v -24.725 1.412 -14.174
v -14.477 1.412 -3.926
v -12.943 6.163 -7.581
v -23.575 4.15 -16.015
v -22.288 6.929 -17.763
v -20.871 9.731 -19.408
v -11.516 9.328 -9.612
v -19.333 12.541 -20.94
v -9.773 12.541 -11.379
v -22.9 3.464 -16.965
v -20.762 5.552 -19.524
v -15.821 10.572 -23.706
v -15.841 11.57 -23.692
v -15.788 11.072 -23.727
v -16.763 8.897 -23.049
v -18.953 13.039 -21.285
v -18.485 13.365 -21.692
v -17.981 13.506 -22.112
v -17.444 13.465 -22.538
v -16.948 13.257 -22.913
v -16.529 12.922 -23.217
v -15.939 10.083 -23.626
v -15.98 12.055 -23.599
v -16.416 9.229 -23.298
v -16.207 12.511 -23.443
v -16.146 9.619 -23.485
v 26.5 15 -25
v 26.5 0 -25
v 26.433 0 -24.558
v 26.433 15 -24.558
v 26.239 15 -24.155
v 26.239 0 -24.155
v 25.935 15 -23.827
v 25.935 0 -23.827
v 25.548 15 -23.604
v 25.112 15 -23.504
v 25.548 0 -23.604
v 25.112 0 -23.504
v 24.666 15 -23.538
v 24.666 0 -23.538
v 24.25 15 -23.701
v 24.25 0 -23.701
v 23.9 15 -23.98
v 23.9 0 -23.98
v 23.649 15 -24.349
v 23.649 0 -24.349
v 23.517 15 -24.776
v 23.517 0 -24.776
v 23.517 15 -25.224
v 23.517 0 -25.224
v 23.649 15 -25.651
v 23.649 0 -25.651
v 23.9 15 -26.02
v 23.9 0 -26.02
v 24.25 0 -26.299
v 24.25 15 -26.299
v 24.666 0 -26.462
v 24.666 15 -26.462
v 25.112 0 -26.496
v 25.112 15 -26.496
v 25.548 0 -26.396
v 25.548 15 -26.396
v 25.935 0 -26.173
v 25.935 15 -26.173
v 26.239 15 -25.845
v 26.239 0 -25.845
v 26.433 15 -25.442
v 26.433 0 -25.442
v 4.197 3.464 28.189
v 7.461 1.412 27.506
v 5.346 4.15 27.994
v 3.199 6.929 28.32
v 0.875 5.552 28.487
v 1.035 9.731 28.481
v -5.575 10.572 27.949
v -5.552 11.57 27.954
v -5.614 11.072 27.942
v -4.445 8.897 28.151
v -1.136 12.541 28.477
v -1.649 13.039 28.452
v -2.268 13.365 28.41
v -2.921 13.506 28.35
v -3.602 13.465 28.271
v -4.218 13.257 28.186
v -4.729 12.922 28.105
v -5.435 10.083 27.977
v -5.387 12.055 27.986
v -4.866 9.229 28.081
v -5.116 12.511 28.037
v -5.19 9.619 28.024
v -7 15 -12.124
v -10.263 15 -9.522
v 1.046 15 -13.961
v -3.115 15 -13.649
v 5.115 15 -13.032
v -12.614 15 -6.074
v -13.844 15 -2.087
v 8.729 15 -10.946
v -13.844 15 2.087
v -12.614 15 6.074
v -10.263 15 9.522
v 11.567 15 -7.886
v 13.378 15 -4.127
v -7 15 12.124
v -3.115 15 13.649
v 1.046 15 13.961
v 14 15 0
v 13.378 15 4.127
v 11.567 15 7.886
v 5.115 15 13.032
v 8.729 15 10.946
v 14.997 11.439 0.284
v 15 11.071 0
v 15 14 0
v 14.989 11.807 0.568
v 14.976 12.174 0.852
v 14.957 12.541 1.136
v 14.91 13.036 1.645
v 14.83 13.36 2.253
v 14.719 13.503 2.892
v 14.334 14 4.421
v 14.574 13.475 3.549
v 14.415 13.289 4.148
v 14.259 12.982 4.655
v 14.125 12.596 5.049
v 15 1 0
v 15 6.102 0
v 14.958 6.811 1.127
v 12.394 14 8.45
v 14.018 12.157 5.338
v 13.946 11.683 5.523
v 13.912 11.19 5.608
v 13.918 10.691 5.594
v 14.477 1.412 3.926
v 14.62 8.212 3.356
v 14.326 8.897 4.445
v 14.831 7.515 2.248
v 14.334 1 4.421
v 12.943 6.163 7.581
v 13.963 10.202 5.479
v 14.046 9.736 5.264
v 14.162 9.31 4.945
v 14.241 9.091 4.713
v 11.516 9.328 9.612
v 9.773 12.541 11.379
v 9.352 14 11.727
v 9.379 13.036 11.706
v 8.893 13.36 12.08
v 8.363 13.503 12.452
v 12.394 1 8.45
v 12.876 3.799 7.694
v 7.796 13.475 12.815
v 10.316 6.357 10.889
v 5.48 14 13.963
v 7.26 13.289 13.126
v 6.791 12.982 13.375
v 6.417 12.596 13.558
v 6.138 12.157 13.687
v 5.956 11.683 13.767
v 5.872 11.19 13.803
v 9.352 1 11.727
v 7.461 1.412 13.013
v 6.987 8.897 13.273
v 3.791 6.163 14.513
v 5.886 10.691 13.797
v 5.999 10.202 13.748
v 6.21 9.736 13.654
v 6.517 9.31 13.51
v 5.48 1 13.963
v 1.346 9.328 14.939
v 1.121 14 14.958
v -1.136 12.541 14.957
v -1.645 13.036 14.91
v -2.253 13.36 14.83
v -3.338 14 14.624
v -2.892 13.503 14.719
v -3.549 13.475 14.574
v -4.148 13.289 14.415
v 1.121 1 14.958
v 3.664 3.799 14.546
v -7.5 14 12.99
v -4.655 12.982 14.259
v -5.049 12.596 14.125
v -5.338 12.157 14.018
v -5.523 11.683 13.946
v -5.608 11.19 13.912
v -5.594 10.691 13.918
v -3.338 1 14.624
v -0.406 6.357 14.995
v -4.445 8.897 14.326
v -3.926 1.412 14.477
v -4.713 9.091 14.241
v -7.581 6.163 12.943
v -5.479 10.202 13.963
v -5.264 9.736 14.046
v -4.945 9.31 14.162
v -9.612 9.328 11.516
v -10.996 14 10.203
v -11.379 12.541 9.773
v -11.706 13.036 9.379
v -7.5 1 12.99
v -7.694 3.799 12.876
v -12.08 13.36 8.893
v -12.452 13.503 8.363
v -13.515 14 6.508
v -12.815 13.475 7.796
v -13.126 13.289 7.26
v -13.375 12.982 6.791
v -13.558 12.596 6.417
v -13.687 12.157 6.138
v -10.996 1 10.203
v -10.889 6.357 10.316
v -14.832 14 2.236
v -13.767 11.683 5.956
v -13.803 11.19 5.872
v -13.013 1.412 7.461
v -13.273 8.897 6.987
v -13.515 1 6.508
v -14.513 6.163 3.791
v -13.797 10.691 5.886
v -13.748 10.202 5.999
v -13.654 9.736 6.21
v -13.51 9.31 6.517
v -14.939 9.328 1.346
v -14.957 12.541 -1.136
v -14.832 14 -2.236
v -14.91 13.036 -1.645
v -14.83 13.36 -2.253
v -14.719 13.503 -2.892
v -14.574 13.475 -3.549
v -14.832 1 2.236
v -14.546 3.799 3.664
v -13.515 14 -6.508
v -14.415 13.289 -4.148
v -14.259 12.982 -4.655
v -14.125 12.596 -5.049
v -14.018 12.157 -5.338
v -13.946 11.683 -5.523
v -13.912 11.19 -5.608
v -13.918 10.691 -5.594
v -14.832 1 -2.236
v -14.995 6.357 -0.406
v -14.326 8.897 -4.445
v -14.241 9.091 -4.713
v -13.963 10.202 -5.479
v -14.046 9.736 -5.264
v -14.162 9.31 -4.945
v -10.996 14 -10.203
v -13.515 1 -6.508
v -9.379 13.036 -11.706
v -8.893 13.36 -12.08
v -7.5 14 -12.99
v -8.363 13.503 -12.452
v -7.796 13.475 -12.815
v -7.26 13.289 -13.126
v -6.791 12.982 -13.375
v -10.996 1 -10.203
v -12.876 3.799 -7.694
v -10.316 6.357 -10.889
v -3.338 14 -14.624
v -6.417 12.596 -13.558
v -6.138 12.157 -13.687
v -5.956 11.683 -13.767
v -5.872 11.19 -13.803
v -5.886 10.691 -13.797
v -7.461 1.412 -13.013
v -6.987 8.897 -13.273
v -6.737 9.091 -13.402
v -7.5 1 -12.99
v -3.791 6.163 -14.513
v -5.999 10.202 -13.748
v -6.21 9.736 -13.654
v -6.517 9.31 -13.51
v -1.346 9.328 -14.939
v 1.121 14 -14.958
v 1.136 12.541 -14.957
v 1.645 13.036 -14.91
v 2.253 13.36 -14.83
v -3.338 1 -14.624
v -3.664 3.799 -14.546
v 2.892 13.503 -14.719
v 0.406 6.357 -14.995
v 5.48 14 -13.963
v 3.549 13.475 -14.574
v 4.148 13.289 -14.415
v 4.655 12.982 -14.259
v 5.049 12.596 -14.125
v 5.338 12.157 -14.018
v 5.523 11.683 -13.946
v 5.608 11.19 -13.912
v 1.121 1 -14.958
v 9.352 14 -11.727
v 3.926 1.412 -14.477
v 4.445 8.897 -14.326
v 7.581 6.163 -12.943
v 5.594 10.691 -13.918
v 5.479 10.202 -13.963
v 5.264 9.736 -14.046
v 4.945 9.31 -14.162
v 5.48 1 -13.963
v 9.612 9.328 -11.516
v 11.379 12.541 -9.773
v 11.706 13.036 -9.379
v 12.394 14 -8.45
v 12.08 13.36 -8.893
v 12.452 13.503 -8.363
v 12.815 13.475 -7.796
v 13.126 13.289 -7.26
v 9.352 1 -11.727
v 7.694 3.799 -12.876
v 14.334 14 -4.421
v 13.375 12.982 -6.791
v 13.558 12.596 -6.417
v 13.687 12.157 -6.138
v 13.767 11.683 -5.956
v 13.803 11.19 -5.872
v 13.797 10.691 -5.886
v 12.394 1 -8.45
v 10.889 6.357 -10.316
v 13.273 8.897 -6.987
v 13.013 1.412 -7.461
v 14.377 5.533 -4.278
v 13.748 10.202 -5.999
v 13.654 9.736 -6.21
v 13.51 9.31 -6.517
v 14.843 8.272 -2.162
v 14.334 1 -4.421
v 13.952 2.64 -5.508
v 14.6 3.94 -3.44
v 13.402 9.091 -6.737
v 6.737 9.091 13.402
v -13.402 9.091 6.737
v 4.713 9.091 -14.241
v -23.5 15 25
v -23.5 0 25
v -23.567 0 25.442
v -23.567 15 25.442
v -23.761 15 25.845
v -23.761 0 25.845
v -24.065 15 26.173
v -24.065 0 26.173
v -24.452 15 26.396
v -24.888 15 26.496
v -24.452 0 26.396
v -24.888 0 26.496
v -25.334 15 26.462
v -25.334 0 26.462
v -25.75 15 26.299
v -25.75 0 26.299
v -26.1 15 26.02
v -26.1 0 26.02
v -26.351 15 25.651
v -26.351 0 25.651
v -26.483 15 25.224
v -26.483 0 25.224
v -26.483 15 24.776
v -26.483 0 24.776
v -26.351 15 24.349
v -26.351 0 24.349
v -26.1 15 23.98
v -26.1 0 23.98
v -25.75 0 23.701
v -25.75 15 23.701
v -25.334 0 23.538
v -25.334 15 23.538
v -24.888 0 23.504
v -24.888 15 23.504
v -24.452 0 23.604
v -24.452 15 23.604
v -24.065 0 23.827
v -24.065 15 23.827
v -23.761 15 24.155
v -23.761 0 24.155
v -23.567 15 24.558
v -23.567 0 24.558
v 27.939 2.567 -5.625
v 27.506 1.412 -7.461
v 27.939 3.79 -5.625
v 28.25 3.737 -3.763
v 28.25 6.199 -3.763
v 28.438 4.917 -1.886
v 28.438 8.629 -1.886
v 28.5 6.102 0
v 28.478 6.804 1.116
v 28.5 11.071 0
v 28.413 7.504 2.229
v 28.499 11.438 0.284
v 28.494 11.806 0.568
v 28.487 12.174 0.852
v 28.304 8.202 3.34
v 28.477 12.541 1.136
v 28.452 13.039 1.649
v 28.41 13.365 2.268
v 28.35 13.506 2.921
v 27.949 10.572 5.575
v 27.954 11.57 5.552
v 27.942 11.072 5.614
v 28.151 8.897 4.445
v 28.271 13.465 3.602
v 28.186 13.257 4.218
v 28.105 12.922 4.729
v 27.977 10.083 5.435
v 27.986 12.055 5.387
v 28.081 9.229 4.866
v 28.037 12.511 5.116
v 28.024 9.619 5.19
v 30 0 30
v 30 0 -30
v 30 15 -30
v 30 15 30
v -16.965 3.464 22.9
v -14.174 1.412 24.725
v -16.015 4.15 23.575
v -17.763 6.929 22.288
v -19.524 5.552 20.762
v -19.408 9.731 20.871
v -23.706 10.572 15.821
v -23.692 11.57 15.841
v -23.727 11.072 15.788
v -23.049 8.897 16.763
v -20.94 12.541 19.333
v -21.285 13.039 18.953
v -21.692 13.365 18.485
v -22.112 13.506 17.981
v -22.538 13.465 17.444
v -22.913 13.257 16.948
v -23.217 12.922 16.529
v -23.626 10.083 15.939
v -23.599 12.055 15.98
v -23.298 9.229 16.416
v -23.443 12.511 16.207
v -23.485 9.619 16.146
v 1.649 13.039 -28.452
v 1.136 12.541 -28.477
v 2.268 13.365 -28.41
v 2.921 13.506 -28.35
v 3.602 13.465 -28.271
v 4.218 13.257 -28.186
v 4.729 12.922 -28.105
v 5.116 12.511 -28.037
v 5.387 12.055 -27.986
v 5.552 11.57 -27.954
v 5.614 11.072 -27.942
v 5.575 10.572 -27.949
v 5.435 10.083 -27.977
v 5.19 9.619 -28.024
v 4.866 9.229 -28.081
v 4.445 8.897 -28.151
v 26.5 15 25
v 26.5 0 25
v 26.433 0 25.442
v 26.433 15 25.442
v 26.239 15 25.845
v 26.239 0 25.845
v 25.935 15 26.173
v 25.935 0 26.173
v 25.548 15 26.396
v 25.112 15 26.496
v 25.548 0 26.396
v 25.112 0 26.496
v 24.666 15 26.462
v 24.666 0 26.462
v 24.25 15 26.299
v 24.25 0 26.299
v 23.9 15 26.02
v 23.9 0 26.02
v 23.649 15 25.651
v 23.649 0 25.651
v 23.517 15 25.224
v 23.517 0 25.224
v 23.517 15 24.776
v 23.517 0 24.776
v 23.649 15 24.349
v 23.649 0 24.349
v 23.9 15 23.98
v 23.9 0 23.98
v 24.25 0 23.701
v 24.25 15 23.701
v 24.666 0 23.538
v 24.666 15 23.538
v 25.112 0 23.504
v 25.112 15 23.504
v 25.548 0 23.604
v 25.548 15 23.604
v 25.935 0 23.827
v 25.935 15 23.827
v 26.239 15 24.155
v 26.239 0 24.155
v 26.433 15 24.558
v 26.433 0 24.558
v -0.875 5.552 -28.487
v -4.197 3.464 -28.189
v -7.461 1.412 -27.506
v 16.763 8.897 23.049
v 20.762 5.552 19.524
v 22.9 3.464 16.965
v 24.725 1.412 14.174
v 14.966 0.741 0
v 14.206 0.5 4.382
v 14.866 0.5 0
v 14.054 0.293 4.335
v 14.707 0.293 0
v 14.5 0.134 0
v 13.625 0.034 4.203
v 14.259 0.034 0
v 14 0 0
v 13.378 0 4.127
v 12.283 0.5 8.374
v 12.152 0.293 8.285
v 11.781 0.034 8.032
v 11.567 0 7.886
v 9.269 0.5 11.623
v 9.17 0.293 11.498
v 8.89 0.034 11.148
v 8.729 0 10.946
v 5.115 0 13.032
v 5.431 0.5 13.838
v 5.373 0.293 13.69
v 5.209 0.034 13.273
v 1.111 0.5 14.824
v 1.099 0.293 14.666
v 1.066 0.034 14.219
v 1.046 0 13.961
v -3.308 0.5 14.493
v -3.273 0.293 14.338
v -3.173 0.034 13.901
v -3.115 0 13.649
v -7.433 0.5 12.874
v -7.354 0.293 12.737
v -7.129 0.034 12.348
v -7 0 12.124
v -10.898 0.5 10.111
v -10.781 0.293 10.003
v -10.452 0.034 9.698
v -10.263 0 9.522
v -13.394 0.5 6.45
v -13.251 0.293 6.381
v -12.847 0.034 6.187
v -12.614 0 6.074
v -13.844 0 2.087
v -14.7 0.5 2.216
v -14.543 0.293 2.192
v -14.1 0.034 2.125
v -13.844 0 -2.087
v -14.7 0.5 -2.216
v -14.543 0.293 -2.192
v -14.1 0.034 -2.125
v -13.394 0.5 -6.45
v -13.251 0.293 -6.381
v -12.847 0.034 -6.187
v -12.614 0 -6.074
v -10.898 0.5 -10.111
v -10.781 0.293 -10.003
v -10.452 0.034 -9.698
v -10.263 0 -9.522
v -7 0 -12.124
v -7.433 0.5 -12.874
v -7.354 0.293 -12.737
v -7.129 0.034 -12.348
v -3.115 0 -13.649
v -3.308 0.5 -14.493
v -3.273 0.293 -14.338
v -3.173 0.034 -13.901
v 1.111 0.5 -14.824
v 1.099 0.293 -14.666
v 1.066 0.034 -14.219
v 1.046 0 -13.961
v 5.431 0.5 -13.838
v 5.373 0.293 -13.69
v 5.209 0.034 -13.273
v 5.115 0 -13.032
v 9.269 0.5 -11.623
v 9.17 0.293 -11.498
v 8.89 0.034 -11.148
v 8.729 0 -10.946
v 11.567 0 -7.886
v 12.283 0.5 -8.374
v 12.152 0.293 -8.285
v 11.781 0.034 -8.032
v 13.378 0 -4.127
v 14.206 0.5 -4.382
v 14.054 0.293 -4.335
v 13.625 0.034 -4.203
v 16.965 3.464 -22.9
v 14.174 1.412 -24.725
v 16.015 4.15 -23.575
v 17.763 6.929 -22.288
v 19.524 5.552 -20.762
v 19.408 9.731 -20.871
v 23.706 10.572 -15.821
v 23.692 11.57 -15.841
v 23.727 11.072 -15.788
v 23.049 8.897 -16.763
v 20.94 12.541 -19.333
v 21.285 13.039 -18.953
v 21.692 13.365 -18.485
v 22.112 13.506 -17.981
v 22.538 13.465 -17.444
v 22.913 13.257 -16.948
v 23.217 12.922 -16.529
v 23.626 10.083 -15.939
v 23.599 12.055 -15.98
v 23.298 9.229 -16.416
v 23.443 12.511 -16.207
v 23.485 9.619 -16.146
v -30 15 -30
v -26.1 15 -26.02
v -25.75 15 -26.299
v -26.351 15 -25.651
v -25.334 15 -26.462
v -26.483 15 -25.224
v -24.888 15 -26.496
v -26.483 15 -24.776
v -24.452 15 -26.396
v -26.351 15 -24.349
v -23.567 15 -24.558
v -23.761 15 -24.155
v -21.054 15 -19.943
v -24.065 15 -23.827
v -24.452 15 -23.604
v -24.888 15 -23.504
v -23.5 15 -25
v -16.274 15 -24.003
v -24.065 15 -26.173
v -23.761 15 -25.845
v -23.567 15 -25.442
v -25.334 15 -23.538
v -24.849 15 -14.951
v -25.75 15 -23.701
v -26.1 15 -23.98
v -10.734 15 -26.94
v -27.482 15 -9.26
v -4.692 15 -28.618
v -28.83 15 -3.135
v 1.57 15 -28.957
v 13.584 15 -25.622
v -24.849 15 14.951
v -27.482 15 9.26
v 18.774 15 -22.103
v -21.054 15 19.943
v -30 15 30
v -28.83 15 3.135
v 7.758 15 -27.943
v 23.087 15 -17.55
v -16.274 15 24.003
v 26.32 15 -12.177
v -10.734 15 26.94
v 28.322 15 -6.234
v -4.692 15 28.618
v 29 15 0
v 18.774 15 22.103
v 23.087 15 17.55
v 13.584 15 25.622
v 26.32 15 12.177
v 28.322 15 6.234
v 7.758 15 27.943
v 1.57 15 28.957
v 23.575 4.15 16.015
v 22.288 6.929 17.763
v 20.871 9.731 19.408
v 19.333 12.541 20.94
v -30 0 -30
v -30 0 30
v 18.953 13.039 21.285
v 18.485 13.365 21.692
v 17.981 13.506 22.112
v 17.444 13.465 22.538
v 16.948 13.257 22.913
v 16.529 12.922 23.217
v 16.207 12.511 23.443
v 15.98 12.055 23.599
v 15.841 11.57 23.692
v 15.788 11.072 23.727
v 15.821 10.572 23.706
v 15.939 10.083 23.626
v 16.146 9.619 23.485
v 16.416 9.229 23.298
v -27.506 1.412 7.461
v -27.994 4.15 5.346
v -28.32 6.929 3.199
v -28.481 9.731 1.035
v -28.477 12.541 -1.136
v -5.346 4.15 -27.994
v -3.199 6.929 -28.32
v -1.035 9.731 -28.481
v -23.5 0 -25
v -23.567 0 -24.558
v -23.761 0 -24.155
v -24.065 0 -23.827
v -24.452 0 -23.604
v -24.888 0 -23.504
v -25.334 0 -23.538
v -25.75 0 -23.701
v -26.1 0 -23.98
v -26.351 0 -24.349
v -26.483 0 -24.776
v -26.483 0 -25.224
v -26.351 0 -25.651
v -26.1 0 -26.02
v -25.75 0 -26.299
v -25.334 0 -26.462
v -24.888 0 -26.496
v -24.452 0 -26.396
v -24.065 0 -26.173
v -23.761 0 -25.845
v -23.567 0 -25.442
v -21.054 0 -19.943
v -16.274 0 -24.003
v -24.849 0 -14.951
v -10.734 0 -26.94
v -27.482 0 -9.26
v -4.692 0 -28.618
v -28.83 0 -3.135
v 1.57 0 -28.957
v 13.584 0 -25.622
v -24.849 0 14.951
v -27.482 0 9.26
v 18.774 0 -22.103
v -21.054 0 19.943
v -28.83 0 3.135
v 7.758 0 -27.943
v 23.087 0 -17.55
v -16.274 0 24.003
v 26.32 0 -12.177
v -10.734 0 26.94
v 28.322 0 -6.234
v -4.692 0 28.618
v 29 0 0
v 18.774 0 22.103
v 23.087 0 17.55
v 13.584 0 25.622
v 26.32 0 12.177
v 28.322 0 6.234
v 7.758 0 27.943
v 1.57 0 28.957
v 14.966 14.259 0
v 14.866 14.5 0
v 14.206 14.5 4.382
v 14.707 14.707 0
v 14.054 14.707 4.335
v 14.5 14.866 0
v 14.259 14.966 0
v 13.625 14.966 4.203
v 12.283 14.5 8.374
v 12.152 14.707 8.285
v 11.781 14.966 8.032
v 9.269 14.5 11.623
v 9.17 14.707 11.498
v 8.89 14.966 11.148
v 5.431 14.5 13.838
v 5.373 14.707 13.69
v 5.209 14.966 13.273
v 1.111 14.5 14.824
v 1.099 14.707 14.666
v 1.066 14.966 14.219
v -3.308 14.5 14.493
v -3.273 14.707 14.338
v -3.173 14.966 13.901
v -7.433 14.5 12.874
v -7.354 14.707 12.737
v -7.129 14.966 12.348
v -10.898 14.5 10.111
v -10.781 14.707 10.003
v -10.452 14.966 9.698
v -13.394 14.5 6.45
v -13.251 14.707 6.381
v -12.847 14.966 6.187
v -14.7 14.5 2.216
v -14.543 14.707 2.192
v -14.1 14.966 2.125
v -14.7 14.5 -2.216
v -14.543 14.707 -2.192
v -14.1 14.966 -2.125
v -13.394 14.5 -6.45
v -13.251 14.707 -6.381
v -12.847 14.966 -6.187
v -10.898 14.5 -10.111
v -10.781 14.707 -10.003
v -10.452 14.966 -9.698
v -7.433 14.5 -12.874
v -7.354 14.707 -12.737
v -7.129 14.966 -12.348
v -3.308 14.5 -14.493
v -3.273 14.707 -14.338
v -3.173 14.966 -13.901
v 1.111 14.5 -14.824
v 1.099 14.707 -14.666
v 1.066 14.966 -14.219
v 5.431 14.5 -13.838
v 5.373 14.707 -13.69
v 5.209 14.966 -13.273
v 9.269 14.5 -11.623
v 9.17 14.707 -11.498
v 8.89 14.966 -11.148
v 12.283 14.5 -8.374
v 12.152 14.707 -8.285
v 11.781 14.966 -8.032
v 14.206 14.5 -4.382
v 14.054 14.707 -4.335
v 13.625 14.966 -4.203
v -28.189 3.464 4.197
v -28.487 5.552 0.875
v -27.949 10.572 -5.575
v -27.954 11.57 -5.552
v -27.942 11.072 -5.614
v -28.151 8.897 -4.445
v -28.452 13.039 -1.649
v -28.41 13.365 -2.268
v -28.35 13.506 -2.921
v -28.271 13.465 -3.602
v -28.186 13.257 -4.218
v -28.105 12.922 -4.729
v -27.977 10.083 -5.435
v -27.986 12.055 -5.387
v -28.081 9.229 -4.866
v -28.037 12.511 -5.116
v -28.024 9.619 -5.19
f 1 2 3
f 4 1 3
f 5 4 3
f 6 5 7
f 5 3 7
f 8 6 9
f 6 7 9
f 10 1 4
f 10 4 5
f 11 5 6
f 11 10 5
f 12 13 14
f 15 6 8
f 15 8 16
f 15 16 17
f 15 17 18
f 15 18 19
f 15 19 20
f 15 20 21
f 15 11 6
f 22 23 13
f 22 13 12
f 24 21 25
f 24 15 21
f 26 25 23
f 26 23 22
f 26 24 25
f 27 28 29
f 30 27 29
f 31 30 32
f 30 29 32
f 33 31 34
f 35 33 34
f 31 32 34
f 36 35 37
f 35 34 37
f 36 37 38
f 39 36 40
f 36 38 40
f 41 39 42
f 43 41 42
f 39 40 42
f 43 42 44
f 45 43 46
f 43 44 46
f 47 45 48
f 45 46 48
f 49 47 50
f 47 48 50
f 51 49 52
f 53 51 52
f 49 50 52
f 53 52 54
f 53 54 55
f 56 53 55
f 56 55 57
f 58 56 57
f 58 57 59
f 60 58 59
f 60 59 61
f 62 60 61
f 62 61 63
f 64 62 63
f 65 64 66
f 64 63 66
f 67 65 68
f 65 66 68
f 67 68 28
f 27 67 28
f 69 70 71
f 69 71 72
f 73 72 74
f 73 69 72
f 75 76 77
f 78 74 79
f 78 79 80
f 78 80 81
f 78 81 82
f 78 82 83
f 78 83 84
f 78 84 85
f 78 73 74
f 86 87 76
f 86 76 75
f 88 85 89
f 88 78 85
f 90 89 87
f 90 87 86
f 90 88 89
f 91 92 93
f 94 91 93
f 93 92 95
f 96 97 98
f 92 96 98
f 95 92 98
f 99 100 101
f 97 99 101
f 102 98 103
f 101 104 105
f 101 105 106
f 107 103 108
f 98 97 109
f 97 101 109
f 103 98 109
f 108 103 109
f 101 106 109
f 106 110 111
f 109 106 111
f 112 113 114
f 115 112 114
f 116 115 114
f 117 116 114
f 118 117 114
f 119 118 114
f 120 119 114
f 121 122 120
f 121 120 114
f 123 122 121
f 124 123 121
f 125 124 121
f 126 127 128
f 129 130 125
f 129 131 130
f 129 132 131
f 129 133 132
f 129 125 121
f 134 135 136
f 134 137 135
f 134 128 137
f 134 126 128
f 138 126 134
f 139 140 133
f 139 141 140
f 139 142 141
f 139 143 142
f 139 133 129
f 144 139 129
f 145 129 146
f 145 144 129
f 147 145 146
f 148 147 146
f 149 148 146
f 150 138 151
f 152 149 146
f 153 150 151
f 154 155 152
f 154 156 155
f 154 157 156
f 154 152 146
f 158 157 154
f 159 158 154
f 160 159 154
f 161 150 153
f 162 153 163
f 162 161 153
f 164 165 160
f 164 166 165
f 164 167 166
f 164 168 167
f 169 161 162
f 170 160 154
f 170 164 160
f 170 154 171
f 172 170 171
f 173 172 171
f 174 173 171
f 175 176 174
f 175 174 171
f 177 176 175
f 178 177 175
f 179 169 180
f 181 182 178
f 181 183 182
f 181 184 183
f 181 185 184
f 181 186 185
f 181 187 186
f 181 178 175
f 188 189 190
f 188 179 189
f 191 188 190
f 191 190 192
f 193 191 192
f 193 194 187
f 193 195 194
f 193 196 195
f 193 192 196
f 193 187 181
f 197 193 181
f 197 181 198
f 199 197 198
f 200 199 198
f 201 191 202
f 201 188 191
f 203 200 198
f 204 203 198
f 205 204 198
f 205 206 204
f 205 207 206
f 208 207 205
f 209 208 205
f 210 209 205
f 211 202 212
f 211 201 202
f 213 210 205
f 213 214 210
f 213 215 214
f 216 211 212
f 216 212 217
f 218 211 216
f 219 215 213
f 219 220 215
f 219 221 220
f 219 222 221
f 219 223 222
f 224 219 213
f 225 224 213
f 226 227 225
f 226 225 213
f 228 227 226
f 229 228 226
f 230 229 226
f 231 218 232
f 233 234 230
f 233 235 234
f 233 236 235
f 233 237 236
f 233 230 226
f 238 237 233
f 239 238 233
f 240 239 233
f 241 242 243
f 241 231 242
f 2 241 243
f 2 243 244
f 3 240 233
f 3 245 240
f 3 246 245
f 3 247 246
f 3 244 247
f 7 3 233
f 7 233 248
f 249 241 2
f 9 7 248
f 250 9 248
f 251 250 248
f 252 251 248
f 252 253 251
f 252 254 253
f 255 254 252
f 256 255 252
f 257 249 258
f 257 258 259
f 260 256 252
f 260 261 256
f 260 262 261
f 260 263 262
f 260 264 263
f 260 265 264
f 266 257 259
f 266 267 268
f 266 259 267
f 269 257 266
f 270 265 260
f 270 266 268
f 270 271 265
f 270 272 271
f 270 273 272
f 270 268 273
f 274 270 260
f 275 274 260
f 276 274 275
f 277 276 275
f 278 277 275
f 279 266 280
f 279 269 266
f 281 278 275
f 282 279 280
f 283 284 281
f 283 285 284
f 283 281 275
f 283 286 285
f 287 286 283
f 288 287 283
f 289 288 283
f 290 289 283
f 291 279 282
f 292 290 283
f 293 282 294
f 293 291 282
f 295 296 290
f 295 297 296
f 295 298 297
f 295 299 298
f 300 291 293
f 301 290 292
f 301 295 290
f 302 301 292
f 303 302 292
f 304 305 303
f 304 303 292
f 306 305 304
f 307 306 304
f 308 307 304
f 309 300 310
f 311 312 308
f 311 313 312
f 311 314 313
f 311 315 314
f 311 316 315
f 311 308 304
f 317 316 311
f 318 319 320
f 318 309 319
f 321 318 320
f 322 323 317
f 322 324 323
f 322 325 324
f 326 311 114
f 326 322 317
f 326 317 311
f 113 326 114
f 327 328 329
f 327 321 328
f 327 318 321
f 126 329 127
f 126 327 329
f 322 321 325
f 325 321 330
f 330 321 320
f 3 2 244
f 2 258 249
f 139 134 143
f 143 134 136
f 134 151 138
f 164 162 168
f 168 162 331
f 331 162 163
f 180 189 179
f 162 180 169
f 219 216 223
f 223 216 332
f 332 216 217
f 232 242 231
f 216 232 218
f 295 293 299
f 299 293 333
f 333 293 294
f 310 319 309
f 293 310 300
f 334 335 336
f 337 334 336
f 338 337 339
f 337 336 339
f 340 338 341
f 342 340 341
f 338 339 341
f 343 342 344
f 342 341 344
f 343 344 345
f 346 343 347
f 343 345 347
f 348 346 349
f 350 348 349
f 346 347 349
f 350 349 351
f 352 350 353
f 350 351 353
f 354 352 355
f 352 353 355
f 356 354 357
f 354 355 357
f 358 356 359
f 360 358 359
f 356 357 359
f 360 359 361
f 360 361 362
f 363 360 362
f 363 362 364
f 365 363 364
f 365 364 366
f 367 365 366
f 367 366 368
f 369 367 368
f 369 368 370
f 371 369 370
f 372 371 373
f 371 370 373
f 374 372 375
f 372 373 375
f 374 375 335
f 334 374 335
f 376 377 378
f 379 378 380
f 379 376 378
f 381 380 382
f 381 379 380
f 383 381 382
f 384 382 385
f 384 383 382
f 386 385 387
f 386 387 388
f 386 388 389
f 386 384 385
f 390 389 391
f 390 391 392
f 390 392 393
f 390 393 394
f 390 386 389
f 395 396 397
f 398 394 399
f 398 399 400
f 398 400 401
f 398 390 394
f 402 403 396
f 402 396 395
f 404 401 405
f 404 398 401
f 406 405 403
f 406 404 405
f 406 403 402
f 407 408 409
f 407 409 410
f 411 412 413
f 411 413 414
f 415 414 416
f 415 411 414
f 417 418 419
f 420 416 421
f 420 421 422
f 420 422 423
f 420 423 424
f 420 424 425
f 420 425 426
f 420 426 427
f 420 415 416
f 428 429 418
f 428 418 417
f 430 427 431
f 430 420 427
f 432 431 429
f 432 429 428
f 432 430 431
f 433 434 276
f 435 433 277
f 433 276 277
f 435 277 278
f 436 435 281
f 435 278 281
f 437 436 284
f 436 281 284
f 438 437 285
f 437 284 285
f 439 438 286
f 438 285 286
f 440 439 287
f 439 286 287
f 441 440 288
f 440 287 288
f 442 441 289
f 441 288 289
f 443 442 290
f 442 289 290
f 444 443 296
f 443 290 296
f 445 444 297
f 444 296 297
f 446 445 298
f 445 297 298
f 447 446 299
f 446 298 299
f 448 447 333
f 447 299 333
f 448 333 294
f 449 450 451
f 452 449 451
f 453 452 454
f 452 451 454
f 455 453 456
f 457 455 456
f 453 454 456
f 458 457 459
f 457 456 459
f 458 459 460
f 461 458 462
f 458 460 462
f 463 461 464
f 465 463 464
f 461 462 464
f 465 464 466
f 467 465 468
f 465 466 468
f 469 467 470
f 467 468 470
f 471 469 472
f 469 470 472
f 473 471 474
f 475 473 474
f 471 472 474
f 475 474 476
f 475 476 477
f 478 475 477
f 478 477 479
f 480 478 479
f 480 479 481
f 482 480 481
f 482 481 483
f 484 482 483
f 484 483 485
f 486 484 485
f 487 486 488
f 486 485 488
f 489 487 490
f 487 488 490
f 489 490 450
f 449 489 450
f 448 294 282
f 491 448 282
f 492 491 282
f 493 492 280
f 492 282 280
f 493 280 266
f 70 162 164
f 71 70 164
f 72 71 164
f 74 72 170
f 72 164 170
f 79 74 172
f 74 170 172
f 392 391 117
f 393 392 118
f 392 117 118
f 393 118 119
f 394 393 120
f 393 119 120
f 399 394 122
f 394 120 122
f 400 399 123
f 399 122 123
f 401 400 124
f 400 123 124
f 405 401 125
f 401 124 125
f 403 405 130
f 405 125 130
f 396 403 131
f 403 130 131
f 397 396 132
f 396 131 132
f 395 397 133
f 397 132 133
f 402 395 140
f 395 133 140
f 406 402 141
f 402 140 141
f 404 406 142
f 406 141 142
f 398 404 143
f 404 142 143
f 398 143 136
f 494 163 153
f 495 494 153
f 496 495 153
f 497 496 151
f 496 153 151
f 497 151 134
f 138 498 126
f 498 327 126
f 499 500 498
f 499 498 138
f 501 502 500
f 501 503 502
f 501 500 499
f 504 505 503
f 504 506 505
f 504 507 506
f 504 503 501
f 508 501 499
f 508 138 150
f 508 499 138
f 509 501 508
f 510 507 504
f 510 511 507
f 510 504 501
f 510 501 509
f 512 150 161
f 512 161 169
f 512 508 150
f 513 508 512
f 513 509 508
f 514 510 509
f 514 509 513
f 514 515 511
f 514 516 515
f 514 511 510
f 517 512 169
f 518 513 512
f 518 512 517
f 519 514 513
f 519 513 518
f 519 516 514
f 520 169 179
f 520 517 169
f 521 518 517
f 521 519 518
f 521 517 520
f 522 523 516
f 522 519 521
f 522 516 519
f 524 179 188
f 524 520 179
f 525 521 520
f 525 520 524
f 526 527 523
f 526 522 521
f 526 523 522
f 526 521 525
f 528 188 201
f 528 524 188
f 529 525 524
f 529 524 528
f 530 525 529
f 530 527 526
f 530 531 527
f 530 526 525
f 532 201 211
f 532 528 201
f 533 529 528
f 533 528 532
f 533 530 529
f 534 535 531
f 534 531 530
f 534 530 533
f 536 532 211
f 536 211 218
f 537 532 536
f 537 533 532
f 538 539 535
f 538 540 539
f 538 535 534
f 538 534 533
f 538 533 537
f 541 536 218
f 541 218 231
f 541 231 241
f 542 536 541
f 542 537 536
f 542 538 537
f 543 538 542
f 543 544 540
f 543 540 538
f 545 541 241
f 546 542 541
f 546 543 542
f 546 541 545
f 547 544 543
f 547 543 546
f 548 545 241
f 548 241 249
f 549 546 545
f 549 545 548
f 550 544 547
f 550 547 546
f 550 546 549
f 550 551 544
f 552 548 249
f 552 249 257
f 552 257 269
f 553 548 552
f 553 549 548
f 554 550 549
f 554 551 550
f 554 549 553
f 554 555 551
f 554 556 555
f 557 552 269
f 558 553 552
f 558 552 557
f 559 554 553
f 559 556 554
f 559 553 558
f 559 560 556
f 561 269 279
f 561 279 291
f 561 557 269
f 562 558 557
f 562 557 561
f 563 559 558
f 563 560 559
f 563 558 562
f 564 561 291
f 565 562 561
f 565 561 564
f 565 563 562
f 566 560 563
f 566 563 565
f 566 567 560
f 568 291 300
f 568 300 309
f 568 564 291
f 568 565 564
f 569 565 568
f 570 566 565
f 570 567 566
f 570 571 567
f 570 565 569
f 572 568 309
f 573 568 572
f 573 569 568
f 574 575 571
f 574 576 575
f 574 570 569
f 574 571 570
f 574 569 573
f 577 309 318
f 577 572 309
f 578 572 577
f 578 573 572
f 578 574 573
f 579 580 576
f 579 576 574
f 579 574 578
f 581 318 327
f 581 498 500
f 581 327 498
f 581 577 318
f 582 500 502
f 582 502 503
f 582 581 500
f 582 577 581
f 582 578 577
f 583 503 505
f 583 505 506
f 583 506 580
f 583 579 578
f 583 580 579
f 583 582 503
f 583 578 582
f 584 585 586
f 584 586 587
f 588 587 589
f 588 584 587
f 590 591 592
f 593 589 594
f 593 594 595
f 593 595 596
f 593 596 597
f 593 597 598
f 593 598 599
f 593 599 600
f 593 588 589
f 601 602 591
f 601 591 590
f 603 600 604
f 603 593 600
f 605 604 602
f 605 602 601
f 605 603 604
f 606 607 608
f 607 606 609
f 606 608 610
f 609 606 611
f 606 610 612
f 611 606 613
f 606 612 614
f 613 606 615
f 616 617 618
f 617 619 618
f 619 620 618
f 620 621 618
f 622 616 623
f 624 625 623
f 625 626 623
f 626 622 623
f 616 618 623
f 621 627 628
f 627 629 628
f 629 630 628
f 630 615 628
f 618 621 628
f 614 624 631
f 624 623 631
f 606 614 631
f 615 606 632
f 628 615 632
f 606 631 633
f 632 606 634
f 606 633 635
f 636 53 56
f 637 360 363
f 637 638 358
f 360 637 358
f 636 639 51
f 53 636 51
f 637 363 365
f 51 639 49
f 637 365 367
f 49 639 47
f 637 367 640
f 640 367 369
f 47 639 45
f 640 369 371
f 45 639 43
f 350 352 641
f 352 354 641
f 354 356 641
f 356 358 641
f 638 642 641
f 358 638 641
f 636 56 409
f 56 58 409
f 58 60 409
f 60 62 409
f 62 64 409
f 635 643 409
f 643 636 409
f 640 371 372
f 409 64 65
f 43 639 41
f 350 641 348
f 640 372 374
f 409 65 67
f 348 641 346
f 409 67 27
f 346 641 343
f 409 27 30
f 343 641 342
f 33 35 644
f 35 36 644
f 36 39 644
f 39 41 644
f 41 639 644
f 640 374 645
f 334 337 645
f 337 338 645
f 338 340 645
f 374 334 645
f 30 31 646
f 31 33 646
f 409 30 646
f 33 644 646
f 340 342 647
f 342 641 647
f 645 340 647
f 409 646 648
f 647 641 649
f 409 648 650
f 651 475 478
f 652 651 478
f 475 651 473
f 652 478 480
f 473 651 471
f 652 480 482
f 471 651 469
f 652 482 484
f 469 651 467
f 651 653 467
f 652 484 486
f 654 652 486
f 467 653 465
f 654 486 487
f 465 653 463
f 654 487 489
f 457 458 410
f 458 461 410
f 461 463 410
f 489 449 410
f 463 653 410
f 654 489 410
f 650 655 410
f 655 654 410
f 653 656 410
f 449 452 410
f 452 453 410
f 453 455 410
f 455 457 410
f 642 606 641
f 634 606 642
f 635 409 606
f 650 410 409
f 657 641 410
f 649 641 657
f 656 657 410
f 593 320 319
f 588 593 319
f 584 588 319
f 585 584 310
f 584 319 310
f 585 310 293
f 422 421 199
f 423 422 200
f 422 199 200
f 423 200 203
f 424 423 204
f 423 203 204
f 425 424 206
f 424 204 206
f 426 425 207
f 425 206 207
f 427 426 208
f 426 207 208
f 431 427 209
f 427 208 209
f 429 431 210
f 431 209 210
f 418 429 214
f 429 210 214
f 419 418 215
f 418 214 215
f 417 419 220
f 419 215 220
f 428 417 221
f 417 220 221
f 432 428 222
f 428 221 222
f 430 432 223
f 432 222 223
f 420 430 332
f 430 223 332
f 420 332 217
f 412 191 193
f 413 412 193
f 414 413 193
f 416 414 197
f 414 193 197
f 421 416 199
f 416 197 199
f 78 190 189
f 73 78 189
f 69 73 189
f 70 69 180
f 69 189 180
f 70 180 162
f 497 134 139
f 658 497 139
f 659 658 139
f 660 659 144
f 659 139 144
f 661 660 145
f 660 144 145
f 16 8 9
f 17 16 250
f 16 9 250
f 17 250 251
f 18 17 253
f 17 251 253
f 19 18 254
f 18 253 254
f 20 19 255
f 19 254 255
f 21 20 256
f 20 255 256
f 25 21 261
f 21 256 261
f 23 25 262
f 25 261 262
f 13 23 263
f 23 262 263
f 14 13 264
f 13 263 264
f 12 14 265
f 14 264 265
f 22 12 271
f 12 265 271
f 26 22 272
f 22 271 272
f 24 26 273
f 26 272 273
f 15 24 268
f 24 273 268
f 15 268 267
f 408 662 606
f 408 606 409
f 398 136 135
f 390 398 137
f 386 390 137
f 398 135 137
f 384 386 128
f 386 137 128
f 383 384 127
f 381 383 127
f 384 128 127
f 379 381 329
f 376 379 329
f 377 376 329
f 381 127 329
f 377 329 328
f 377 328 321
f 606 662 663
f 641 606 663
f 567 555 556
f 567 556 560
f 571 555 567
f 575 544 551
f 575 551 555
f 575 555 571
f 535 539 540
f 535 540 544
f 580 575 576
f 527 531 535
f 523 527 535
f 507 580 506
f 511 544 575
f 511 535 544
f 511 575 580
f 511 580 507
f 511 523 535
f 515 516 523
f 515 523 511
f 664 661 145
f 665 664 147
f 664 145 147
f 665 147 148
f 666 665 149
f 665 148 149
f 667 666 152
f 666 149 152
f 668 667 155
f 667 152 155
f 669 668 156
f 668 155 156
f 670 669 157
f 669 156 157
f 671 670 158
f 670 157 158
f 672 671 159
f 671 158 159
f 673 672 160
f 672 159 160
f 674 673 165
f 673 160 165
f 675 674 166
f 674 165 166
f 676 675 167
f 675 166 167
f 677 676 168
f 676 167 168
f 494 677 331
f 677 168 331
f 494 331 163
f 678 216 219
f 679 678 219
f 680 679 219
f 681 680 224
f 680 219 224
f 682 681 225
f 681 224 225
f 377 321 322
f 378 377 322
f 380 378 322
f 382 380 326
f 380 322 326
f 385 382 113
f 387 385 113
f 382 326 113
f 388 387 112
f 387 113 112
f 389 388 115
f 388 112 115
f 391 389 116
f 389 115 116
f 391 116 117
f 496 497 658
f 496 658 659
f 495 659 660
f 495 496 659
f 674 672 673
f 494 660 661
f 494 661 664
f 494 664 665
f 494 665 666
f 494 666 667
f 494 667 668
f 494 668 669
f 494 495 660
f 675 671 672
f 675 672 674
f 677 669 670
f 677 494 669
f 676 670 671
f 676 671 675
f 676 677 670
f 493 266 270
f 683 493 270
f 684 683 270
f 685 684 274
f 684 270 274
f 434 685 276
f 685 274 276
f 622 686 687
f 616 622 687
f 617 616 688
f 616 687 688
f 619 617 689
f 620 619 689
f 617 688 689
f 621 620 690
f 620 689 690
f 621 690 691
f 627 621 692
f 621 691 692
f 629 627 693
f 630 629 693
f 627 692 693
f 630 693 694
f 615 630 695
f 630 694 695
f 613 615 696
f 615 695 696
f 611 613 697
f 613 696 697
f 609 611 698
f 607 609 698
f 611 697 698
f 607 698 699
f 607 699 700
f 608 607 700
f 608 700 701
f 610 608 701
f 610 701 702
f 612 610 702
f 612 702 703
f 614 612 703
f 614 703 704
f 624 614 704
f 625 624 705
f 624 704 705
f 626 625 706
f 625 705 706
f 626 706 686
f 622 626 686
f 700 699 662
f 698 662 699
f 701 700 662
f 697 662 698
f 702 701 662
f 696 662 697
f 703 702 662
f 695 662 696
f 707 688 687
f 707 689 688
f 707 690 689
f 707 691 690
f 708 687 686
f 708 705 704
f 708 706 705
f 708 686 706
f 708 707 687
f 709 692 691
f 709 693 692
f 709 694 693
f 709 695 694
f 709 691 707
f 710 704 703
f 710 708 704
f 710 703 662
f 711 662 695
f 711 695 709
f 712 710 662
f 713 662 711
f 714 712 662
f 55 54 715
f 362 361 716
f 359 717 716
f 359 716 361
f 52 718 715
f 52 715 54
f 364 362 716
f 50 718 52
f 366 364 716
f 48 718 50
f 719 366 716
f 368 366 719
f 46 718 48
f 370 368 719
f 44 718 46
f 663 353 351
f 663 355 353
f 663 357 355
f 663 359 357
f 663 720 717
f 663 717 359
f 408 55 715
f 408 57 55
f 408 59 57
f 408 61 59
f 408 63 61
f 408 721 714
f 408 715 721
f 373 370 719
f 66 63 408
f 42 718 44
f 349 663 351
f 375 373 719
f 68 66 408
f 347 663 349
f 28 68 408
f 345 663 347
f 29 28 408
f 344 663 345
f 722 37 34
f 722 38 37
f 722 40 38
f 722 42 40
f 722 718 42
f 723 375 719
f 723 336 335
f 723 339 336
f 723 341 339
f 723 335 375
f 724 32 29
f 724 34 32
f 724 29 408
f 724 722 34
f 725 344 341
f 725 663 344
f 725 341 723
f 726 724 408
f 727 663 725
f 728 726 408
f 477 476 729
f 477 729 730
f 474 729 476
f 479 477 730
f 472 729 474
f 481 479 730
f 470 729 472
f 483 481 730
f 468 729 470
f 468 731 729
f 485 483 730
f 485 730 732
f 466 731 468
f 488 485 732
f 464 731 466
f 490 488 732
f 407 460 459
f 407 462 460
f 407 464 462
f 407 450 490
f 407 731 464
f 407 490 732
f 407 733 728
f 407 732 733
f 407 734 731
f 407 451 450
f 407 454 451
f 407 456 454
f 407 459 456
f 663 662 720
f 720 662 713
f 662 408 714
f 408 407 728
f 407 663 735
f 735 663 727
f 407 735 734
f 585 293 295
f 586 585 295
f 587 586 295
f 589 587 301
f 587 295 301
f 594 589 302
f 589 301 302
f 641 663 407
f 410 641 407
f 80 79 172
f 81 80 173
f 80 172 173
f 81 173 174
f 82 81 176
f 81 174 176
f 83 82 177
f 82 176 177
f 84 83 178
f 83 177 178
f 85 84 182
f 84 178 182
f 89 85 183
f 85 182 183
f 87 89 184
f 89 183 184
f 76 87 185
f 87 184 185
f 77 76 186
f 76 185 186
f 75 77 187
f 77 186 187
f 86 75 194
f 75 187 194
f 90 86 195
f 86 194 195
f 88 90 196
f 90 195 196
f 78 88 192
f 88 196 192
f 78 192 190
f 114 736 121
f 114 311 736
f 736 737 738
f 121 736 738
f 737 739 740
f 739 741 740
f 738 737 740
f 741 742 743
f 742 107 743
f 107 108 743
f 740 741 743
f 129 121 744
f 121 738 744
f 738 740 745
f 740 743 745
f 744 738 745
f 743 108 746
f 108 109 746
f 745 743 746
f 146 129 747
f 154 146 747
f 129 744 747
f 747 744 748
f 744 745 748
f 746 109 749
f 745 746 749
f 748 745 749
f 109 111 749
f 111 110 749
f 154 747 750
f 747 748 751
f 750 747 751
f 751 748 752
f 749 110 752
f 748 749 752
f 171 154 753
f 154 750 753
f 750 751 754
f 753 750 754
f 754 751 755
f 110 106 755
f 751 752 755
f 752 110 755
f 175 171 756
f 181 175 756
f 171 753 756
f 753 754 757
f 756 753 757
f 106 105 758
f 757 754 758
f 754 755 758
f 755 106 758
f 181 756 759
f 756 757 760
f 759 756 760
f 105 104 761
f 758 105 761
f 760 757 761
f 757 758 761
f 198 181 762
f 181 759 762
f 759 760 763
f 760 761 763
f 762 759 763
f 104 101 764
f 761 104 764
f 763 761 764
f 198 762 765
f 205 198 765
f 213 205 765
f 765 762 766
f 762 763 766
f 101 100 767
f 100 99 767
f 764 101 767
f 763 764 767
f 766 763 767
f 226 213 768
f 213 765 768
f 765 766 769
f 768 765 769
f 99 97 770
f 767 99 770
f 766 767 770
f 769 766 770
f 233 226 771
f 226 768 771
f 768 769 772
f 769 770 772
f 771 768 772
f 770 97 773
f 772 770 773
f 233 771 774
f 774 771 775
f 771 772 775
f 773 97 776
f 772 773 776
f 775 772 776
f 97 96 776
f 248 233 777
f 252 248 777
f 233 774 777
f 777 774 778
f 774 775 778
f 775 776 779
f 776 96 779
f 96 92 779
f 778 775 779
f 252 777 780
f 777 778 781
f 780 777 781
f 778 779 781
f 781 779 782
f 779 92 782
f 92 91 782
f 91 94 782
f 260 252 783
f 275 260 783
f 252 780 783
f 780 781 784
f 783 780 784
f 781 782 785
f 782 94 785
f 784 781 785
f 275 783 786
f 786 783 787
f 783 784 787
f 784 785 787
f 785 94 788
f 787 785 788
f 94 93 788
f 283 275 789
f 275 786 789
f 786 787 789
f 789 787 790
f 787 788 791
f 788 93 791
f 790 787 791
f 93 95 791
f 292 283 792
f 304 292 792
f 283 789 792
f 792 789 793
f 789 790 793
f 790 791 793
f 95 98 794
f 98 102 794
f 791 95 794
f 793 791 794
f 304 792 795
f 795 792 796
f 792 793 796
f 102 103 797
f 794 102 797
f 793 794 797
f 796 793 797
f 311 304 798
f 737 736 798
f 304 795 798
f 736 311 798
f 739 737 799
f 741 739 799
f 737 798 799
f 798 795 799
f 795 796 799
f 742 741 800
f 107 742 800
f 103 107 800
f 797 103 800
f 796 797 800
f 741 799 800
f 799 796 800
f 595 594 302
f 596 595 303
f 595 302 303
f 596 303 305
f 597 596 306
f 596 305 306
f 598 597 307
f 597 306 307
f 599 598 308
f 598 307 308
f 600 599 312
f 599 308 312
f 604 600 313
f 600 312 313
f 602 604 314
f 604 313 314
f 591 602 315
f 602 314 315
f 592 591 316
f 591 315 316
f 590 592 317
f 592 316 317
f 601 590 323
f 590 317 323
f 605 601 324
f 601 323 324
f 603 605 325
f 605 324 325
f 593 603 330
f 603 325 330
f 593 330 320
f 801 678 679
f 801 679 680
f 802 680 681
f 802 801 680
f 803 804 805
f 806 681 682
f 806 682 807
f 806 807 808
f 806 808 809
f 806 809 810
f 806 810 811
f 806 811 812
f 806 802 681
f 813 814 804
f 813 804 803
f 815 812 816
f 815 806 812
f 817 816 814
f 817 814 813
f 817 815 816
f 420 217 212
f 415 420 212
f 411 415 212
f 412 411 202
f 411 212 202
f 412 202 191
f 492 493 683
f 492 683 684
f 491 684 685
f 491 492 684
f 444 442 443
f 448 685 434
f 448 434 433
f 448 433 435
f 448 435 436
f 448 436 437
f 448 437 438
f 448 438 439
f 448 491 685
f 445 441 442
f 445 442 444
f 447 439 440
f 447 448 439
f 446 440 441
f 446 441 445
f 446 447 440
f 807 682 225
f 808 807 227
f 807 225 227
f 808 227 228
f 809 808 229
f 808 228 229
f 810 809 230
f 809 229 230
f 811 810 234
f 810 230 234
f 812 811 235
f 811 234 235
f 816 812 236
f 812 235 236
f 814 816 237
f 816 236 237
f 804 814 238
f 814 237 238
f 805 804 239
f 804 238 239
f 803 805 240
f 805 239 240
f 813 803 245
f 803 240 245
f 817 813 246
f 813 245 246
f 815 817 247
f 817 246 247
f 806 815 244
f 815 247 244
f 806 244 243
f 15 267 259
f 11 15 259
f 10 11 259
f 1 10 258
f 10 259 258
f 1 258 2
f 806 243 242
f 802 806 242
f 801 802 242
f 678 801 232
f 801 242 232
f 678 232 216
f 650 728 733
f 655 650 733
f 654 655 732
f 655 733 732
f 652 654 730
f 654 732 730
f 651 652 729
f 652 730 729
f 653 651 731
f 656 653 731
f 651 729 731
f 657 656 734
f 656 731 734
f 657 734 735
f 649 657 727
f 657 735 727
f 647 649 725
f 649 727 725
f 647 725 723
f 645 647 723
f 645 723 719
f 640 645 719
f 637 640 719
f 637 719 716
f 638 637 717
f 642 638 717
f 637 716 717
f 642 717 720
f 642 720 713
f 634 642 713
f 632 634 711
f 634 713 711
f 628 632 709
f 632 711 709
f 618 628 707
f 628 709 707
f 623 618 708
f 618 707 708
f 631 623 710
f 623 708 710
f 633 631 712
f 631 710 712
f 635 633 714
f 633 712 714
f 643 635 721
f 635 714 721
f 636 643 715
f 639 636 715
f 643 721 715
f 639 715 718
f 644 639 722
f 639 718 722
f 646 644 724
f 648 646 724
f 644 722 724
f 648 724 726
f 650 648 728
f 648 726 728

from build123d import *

# Parameters (mm, degrees)
F0_W     = 60
F0_H     = 60
F0_R     = 1.5
F0_R_2   = 29
F1_DEPTH = 15
F3_DEPTH = 30
F4_COUNT = 8
F5_R     = 15
F6_DEPTH = 15
F7_R     = 50
F7_R_2   = 28.5
F8_DEPTH = 15.0010001
F9_R     = 1


with BuildPart() as f1:
    # F0 (on Front) → F1 (new body)
    with BuildSketch(Plane.XZ):
        Rectangle(F0_W, F0_H)
        with Locations((-25, -25)):
            Circle(F0_R, mode=Mode.SUBTRACT)
        with Locations((25, -25)):
            Circle(F0_R, mode=Mode.SUBTRACT)
        with Locations((-25, 25)):
            Circle(F0_R, mode=Mode.SUBTRACT)
        Circle(F0_R_2, mode=Mode.SUBTRACT)
        with Locations((25, 25)):
            Circle(F0_R, mode=Mode.SUBTRACT)
    extrude(amount=-F1_DEPTH)


with BuildPart() as f3:
    # F2 (on Right) → F3 (new body)
    with BuildSketch(Plane.YZ):
        with BuildLine():
            ThreePointArc((12.5414622339, 1.1361150297), (12.6935906366, 4.9655645431), (8.8966268699, 4.4450909307))
            Line((8.8966268699, 4.4450909307), (1.412154641, -7.4609317817))
            Line((1.412154641, -7.4609317817), (12.5414622339, 1.1361150297))
        make_face()
    extrude(amount=F3_DEPTH)


with BuildPart() as f4_1:
    # F4: instance of F3
    add(f3.part.rotate(Axis((0, -8.8478960097, 0), (0, -1, 0)), 1 * 360 / F4_COUNT))


with BuildPart() as f4_2:
    # F4: instance of F3
    add(f3.part.rotate(Axis((0, -8.8478960097, 0), (0, -1, 0)), 2 * 360 / F4_COUNT))


with BuildPart() as f4_3:
    # F4: instance of F3
    add(f3.part.rotate(Axis((0, -8.8478960097, 0), (0, -1, 0)), 3 * 360 / F4_COUNT))


with BuildPart() as f4_4:
    # F4: instance of F3
    add(f3.part.rotate(Axis((0, -8.8478960097, 0), (0, -1, 0)), 4 * 360 / F4_COUNT))


with BuildPart() as f4_5:
    # F4: instance of F3
    add(f3.part.rotate(Axis((0, -8.8478960097, 0), (0, -1, 0)), 5 * 360 / F4_COUNT))


with BuildPart() as f4_6:
    # F4: instance of F3
    add(f3.part.rotate(Axis((0, -8.8478960097, 0), (0, -1, 0)), 6 * 360 / F4_COUNT))


with BuildPart() as f4_7:
    # F4: instance of F3
    add(f3.part.rotate(Axis((0, -8.8478960097, 0), (0, -1, 0)), 7 * 360 / F4_COUNT))


with BuildPart() as f3_1:
    add(f3.part)

    add(f4_1.part)  # F6 merges F4_1

    add(f4_2.part)  # F6 merges F4_2

    add(f4_3.part)  # F6 merges F4_3

    add(f4_4.part)  # F6 merges F4_4

    add(f4_5.part)  # F6 merges F4_5

    add(f4_6.part)  # F6 merges F4_6

    add(f4_7.part)  # F6 merges F4_7
    # F5 (on Front) → F6 (join)
    with BuildSketch(Plane.XZ):
        Circle(F5_R)
    extrude(amount=-F6_DEPTH)

    # F7 (on Front) → F8 (cut, through all)
    with BuildSketch(Plane.XZ):
        Circle(F7_R)
        Circle(F7_R_2, mode=Mode.SUBTRACT)
    extrude(amount=-F8_DEPTH, mode=Mode.SUBTRACT)

    # F9
    f9_edges = [f3_1.edges().sort_by_distance(p)[0] for p in [
        (-15, 0, 0),
        (-15, 15, 0),
    ]]
    fillet(f9_edges, radius=F9_R)


solid = Compound([f1.part, f3_1.part])
